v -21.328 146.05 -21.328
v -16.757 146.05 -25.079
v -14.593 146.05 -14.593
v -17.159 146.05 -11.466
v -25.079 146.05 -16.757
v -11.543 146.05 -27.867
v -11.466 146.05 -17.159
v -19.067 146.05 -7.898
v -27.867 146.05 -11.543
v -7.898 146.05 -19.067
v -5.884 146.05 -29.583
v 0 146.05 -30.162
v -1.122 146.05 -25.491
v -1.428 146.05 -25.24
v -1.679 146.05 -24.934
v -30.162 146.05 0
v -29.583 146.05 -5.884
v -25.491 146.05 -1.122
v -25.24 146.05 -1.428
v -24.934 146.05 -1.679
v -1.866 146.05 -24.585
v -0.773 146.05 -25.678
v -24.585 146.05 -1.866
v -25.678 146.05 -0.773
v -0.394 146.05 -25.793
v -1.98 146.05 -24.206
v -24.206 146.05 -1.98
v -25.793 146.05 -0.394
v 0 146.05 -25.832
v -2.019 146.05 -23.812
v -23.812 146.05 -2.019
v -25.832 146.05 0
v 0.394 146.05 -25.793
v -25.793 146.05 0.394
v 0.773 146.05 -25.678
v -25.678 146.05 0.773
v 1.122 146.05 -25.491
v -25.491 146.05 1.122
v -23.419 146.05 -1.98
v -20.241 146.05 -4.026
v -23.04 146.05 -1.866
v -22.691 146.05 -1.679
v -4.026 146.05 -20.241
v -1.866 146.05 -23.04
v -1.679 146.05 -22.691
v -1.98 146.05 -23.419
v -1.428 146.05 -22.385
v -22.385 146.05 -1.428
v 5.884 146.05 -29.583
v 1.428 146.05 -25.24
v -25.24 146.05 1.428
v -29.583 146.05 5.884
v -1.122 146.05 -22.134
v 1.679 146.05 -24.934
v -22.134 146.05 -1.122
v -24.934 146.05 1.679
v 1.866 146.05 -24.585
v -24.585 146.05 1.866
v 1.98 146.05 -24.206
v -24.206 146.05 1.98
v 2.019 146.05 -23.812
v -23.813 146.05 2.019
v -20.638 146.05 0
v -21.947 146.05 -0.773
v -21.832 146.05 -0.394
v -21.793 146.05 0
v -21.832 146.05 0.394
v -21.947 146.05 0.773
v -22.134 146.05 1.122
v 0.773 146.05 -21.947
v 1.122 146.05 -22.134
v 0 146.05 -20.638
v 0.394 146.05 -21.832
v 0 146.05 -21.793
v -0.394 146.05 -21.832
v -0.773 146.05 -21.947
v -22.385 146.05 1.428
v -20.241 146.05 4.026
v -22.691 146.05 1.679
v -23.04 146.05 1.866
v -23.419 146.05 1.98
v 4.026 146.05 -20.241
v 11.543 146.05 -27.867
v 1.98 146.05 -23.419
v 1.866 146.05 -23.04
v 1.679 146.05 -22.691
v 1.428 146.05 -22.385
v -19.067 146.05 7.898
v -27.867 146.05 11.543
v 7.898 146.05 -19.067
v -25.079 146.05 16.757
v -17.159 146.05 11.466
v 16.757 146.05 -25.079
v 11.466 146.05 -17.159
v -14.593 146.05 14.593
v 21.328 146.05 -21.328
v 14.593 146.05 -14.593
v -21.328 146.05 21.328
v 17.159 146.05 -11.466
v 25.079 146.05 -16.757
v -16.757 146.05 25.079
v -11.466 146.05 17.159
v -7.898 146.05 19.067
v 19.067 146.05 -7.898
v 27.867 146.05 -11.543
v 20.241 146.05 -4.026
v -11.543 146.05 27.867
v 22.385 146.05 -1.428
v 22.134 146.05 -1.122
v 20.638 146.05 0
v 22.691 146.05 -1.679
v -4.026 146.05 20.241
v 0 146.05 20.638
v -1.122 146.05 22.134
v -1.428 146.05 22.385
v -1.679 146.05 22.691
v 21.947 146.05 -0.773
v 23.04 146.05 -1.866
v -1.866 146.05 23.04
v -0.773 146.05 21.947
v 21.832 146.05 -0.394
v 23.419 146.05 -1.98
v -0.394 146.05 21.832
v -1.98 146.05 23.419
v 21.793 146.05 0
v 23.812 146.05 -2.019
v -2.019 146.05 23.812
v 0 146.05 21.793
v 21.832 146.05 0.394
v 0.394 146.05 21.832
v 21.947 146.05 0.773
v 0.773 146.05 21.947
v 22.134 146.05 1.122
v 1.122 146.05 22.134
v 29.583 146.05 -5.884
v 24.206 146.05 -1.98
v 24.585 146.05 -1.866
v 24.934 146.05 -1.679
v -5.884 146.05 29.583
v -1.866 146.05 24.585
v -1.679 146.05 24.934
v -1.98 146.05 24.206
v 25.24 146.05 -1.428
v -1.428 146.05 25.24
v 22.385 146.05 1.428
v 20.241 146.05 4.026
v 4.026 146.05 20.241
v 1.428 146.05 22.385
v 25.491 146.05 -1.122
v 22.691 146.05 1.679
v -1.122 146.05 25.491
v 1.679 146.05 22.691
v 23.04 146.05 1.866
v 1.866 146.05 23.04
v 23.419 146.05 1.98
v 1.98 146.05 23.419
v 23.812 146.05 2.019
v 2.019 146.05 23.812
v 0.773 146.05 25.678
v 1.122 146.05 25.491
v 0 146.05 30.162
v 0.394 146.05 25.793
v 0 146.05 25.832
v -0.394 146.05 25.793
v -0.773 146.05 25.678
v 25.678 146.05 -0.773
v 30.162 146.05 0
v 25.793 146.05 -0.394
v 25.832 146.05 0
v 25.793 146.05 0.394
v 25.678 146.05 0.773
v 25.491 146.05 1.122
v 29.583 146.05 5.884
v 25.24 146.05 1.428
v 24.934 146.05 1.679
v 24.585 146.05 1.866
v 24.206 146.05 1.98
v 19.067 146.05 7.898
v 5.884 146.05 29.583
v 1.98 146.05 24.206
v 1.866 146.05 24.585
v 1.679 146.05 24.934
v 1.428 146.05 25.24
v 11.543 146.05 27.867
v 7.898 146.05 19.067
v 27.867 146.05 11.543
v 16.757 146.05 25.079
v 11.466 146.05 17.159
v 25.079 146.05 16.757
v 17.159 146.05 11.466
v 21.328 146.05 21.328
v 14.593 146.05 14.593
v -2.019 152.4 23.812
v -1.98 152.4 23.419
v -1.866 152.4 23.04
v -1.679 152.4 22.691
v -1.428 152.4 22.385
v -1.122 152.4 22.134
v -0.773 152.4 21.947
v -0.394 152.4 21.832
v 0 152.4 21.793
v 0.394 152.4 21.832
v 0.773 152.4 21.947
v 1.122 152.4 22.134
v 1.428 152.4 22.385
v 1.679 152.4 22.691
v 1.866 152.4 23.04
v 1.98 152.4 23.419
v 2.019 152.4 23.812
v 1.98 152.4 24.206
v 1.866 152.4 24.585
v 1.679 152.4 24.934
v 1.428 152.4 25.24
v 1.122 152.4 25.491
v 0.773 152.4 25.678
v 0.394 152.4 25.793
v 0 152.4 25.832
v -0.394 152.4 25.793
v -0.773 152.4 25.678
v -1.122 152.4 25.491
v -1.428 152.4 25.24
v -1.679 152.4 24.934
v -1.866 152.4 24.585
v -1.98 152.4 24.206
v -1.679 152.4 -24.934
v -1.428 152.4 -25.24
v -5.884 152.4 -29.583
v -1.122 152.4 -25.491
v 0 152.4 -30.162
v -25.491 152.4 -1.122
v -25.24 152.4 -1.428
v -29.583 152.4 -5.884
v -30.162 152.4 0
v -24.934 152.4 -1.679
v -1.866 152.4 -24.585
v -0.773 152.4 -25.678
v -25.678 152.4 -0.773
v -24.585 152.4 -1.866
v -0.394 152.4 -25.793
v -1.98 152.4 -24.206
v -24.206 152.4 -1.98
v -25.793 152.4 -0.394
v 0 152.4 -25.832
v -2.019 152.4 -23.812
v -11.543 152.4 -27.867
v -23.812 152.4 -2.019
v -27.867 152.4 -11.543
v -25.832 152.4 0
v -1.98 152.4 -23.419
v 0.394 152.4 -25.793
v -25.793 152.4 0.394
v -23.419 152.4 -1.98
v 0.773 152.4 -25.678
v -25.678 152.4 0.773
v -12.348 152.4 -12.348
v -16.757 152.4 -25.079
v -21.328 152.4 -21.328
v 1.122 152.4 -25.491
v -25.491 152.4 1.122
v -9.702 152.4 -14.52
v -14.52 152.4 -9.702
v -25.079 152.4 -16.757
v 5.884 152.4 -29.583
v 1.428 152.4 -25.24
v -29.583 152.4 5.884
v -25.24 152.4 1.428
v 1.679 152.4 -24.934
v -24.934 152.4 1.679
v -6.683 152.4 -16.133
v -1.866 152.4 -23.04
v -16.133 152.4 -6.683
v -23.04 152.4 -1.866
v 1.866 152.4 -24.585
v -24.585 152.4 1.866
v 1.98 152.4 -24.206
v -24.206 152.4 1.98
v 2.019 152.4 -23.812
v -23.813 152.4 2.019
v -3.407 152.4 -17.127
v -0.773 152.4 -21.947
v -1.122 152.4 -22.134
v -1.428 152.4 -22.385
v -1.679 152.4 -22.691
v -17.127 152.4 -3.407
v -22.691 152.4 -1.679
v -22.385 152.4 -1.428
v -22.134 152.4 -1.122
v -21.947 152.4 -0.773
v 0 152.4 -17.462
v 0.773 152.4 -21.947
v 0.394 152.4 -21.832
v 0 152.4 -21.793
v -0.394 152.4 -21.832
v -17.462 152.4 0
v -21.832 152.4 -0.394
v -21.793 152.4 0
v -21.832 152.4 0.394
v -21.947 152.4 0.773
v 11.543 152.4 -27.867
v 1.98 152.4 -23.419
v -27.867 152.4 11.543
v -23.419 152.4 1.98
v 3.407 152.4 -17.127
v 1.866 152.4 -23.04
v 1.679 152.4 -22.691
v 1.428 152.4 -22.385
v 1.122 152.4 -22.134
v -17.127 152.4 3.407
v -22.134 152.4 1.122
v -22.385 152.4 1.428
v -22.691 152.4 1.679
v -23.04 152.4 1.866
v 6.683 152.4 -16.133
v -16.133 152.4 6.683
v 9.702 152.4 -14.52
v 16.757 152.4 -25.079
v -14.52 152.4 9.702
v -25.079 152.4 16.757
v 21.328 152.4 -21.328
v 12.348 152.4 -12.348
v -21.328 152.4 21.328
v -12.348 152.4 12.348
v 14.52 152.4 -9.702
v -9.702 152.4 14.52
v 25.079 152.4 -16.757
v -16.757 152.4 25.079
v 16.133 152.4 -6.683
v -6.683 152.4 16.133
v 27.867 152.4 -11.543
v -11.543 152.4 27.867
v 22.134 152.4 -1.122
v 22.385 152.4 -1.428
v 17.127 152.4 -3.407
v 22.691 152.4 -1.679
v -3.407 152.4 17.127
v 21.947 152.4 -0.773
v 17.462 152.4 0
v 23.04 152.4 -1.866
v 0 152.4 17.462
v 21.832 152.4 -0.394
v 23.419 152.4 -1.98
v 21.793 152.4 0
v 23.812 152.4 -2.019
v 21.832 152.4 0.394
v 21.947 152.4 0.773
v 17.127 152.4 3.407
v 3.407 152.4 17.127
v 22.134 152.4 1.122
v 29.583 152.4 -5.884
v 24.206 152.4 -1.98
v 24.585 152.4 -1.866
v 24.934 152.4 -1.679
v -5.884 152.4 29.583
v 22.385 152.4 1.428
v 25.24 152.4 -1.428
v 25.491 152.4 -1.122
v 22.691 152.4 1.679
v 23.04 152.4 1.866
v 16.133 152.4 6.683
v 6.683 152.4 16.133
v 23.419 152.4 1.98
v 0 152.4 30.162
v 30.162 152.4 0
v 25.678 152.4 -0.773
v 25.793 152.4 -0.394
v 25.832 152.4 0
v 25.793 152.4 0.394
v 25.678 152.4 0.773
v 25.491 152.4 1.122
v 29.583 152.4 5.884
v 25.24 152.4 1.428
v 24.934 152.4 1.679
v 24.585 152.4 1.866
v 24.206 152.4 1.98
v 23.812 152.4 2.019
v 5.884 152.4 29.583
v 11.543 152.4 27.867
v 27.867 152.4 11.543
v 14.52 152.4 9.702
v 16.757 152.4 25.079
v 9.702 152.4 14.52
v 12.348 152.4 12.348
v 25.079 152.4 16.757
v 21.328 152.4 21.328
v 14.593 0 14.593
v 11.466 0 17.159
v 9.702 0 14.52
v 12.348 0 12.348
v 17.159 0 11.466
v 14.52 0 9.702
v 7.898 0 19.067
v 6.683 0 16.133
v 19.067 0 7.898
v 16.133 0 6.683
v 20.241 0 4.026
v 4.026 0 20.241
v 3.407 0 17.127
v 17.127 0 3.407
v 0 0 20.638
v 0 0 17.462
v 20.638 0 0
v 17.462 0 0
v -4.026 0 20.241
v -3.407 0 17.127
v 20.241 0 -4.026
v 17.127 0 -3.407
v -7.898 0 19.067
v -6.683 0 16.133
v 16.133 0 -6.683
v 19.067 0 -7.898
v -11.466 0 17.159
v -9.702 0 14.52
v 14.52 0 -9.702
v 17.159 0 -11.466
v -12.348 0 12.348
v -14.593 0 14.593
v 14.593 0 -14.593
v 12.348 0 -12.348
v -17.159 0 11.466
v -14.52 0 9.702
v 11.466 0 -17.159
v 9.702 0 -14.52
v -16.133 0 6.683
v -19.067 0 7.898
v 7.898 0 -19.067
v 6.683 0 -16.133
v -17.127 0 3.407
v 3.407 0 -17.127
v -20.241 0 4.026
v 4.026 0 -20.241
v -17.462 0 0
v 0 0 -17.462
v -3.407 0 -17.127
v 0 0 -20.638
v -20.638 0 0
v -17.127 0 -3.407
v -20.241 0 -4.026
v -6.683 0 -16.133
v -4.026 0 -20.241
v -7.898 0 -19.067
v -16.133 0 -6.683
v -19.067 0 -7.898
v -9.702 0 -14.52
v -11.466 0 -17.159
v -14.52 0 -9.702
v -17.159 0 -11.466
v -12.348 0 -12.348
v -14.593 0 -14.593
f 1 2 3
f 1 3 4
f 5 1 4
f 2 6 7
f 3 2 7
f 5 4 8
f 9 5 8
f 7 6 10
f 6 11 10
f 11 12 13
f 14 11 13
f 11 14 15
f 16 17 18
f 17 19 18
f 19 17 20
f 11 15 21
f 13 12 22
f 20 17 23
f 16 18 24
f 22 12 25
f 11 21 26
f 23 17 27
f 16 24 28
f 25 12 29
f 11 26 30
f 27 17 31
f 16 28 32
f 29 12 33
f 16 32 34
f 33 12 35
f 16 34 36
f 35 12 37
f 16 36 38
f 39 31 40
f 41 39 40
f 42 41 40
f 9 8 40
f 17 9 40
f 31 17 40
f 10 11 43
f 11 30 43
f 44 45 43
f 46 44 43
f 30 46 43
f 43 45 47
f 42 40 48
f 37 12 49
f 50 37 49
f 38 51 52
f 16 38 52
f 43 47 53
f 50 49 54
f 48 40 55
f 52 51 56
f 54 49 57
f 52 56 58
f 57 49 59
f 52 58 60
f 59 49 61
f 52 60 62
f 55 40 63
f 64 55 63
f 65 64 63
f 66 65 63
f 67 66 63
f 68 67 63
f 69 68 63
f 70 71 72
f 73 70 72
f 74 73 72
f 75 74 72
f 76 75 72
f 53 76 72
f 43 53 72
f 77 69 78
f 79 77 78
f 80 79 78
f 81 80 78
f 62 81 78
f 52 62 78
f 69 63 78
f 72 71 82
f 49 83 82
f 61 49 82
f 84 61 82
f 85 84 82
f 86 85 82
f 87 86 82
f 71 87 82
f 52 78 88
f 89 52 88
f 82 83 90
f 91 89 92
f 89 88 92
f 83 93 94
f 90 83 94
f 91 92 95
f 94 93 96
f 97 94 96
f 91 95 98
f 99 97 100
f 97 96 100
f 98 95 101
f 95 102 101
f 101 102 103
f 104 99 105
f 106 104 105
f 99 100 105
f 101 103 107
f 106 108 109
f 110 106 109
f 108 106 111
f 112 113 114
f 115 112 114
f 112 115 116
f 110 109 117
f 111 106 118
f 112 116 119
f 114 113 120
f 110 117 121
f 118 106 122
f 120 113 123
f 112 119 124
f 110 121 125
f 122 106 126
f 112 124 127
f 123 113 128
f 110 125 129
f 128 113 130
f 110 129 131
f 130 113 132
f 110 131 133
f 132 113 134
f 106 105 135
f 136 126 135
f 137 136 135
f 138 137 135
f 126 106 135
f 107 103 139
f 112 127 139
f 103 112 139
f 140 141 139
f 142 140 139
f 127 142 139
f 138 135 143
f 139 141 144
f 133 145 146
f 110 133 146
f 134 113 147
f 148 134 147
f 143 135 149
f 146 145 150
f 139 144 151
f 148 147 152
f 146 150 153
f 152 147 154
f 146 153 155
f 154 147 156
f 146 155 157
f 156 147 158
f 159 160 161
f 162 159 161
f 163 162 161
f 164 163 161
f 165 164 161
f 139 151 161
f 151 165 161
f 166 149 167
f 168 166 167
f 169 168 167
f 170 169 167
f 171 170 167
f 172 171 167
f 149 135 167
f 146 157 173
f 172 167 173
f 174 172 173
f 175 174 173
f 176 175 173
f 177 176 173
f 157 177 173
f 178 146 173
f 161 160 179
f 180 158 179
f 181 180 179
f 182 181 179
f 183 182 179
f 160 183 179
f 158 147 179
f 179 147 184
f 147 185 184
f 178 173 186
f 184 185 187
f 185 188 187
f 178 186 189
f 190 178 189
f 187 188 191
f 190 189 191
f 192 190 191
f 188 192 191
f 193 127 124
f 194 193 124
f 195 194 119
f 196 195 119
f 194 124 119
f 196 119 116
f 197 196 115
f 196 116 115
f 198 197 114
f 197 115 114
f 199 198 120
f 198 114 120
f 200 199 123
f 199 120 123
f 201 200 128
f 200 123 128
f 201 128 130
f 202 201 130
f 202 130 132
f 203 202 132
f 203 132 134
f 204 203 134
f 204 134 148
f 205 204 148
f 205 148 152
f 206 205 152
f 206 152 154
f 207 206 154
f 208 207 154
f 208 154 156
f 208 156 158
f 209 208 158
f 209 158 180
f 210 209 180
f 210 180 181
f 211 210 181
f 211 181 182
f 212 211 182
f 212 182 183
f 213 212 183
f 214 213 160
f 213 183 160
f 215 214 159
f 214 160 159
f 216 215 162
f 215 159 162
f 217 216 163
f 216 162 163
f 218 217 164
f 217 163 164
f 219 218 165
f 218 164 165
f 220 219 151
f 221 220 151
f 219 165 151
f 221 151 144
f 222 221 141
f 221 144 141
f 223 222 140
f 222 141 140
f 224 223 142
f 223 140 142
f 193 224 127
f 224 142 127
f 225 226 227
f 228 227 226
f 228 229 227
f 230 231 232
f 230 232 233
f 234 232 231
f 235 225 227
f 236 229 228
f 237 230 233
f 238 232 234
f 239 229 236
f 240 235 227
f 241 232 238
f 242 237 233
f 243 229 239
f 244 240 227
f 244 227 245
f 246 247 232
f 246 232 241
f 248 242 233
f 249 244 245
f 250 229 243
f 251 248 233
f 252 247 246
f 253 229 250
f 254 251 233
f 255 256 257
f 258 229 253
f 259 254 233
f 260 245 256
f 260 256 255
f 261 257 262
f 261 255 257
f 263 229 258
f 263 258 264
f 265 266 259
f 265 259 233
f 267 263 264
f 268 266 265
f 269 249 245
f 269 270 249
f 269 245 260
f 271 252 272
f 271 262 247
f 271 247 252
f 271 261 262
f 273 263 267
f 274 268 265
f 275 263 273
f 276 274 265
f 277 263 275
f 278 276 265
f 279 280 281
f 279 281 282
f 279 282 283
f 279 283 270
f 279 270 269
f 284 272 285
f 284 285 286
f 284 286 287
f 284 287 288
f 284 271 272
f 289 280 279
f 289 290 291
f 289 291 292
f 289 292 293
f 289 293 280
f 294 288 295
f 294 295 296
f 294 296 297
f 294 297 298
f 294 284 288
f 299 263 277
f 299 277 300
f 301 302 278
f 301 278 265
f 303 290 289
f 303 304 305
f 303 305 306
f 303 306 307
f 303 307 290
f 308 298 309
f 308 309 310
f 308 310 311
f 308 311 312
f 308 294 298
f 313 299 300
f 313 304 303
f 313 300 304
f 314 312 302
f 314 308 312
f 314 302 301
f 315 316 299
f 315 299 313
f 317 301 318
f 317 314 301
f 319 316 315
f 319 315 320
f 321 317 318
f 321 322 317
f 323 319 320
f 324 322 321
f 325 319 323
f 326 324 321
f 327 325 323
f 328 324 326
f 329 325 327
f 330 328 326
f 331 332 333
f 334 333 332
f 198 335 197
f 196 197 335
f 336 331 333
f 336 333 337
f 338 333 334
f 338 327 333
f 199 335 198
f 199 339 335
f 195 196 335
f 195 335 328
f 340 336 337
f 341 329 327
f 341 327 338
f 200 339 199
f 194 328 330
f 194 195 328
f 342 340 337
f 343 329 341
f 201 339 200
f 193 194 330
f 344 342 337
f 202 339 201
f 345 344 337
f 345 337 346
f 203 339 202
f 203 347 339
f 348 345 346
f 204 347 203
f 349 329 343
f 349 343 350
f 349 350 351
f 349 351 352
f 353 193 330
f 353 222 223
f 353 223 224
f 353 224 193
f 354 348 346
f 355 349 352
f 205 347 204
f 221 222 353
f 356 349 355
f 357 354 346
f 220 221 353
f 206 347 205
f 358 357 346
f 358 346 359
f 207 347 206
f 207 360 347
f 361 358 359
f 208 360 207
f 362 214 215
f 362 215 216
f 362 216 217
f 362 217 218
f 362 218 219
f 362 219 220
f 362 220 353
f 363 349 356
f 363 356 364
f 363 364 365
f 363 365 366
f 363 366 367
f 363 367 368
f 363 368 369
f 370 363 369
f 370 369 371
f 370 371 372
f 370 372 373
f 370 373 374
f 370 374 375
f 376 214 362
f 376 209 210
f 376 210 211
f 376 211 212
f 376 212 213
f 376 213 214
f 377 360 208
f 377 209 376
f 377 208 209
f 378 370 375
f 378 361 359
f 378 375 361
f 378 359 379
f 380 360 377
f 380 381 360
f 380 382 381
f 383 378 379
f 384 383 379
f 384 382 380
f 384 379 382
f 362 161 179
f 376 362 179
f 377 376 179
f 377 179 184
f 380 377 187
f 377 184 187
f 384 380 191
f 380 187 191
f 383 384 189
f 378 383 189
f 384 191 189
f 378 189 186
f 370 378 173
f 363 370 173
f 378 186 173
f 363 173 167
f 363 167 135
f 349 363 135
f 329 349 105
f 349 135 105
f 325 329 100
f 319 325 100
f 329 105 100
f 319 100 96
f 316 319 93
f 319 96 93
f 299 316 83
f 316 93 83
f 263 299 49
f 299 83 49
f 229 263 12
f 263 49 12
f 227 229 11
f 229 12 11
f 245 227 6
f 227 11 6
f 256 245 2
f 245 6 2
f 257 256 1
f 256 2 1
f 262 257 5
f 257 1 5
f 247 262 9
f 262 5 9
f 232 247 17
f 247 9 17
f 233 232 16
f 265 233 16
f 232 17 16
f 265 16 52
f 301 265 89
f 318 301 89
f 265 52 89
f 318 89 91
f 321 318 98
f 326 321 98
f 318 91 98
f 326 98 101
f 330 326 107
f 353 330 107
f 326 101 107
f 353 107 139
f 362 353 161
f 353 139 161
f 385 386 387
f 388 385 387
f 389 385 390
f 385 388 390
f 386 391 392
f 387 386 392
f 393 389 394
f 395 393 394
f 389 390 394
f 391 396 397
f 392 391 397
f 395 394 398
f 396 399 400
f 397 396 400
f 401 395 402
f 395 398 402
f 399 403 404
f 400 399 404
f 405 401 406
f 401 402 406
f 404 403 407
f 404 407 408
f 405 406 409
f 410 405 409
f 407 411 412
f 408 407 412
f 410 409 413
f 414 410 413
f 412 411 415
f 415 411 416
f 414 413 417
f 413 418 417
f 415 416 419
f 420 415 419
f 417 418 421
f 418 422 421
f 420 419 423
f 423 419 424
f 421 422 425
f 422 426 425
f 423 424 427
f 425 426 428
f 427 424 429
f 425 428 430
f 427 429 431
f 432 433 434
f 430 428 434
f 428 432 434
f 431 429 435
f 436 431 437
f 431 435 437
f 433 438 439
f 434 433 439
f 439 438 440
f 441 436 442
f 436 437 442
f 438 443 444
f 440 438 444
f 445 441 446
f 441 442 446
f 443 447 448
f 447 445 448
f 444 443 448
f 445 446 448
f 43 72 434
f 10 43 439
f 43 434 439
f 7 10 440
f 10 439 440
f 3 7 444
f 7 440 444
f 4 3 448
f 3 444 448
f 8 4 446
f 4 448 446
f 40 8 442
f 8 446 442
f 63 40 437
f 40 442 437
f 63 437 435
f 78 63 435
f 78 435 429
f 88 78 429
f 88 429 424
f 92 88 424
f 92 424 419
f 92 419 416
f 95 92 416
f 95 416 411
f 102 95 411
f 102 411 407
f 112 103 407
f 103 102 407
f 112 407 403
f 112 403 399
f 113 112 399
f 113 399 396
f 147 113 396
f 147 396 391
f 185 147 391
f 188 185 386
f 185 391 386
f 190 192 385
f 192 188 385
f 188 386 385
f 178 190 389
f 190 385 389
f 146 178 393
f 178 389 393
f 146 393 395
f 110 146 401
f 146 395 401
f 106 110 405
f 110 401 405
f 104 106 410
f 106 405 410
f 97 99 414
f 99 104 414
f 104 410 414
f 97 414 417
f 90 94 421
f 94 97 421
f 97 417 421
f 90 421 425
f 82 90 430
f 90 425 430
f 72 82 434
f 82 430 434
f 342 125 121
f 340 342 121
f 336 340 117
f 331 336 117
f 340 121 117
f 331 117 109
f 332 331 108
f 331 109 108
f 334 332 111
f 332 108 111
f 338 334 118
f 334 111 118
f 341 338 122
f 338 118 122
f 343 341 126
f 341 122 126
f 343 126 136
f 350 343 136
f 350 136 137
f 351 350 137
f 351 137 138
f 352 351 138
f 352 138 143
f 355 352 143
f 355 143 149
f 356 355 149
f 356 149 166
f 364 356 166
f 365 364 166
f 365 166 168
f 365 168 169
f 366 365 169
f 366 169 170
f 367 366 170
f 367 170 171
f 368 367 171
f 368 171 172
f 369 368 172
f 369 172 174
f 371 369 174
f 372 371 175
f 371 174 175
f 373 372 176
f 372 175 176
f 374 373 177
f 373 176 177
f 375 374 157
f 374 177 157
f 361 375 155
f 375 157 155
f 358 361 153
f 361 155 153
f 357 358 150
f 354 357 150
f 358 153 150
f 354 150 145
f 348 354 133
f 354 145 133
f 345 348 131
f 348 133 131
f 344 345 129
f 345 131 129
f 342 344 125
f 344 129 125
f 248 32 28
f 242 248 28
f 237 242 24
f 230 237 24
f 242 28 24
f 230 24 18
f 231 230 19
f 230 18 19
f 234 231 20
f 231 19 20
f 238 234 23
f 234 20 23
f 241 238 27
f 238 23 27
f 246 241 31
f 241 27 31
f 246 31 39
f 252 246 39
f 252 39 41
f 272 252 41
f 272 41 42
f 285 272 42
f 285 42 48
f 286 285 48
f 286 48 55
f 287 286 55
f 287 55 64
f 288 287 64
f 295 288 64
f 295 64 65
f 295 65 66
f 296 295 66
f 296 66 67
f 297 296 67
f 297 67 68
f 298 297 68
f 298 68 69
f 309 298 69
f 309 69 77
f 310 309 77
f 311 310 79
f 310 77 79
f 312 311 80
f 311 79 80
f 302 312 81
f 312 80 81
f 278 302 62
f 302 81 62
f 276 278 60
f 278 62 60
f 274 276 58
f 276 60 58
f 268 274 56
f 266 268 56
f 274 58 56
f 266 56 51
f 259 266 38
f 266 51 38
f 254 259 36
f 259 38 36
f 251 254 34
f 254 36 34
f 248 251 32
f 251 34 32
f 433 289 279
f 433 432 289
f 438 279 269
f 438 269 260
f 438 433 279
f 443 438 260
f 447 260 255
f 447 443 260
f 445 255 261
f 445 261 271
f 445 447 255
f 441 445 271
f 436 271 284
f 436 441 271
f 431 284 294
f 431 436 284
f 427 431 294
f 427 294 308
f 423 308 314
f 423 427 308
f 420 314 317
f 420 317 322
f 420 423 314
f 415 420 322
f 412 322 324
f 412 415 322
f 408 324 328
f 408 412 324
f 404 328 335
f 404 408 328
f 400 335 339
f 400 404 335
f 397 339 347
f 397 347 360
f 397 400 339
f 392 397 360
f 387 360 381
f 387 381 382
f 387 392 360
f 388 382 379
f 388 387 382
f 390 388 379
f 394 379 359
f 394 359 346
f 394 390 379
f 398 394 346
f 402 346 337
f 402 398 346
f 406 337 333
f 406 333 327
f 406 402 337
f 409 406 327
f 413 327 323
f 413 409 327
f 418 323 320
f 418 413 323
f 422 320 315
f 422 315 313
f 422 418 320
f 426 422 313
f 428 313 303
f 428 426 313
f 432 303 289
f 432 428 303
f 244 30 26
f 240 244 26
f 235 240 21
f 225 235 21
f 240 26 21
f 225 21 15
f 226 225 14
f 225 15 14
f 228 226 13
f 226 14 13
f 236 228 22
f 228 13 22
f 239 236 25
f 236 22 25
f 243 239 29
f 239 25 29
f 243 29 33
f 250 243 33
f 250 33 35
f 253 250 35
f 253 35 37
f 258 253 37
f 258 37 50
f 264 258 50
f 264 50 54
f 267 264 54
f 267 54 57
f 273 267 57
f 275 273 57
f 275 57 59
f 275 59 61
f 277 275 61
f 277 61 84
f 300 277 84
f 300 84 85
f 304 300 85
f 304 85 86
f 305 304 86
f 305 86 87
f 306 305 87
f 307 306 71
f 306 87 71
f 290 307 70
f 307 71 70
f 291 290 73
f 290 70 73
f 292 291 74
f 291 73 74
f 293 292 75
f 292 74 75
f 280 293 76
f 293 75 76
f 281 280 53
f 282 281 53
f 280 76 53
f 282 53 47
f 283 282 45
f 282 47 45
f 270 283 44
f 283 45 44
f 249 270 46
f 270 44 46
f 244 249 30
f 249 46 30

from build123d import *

# Parameters (mm, degrees)
SKETCH1_R                  = 20.6375
SKETCH1_R_2                = 17.4625
BOSS_EXTRUDE1_DEPTH        = 152.4
BOSS_EXTRUDE2_START        = -6.35
SKETCH2_R                  = 30.1625
SKETCH2_R_2                = 17.4625
BOSS_EXTRUDE2_DEPTH        = 6.35
F_10_32_TAPPED_HOLE1_D     = 4.0386
F_10_32_TAPPED_HOLE1_DEPTH = 6.35


with BuildPart() as part:
    # Sketch1 → Boss-Extrude1 (new body)
    with BuildSketch(Plane(origin=(0, 0, 0), x_dir=(1, 0, 0), z_dir=(0, 1, 0))):
        with Locations(Location((0, 0, 0), (0, 0, 90))):
            Circle(SKETCH1_R)
        with Locations(Location((0, 0, 0), (0, 0, 90))):
            Circle(SKETCH1_R_2, mode=Mode.SUBTRACT)
    extrude(amount=BOSS_EXTRUDE1_DEPTH)

    # Sketch2 → Boss-Extrude2 (add)
    with BuildSketch(Plane(origin=(0, 152.4, 0), x_dir=(1, 0, 0), z_dir=(0, 1, 0)).offset(BOSS_EXTRUDE2_START)):
        with Locations(Location((0, 0, 0), (0, 0, 270))):
            Circle(SKETCH2_R)
        with Locations(Location((0, 0, 0), (0, 0, 90))):
            Circle(SKETCH2_R_2, mode=Mode.SUBTRACT)
    extrude(amount=BOSS_EXTRUDE2_DEPTH)

    # #10-32 Tapped Hole1
    with Locations(Plane(origin=(0, 152.4, 0), x_dir=(1, 0, 0), z_dir=(0, 1, 0))):
        with Locations((-23.8125, 0), (0, 23.8125), (23.8125, 0), (0, -23.8125), (0, 0)):
            Hole(F_10_32_TAPPED_HOLE1_D / 2, depth=F_10_32_TAPPED_HOLE1_DEPTH)


solid = part.part
